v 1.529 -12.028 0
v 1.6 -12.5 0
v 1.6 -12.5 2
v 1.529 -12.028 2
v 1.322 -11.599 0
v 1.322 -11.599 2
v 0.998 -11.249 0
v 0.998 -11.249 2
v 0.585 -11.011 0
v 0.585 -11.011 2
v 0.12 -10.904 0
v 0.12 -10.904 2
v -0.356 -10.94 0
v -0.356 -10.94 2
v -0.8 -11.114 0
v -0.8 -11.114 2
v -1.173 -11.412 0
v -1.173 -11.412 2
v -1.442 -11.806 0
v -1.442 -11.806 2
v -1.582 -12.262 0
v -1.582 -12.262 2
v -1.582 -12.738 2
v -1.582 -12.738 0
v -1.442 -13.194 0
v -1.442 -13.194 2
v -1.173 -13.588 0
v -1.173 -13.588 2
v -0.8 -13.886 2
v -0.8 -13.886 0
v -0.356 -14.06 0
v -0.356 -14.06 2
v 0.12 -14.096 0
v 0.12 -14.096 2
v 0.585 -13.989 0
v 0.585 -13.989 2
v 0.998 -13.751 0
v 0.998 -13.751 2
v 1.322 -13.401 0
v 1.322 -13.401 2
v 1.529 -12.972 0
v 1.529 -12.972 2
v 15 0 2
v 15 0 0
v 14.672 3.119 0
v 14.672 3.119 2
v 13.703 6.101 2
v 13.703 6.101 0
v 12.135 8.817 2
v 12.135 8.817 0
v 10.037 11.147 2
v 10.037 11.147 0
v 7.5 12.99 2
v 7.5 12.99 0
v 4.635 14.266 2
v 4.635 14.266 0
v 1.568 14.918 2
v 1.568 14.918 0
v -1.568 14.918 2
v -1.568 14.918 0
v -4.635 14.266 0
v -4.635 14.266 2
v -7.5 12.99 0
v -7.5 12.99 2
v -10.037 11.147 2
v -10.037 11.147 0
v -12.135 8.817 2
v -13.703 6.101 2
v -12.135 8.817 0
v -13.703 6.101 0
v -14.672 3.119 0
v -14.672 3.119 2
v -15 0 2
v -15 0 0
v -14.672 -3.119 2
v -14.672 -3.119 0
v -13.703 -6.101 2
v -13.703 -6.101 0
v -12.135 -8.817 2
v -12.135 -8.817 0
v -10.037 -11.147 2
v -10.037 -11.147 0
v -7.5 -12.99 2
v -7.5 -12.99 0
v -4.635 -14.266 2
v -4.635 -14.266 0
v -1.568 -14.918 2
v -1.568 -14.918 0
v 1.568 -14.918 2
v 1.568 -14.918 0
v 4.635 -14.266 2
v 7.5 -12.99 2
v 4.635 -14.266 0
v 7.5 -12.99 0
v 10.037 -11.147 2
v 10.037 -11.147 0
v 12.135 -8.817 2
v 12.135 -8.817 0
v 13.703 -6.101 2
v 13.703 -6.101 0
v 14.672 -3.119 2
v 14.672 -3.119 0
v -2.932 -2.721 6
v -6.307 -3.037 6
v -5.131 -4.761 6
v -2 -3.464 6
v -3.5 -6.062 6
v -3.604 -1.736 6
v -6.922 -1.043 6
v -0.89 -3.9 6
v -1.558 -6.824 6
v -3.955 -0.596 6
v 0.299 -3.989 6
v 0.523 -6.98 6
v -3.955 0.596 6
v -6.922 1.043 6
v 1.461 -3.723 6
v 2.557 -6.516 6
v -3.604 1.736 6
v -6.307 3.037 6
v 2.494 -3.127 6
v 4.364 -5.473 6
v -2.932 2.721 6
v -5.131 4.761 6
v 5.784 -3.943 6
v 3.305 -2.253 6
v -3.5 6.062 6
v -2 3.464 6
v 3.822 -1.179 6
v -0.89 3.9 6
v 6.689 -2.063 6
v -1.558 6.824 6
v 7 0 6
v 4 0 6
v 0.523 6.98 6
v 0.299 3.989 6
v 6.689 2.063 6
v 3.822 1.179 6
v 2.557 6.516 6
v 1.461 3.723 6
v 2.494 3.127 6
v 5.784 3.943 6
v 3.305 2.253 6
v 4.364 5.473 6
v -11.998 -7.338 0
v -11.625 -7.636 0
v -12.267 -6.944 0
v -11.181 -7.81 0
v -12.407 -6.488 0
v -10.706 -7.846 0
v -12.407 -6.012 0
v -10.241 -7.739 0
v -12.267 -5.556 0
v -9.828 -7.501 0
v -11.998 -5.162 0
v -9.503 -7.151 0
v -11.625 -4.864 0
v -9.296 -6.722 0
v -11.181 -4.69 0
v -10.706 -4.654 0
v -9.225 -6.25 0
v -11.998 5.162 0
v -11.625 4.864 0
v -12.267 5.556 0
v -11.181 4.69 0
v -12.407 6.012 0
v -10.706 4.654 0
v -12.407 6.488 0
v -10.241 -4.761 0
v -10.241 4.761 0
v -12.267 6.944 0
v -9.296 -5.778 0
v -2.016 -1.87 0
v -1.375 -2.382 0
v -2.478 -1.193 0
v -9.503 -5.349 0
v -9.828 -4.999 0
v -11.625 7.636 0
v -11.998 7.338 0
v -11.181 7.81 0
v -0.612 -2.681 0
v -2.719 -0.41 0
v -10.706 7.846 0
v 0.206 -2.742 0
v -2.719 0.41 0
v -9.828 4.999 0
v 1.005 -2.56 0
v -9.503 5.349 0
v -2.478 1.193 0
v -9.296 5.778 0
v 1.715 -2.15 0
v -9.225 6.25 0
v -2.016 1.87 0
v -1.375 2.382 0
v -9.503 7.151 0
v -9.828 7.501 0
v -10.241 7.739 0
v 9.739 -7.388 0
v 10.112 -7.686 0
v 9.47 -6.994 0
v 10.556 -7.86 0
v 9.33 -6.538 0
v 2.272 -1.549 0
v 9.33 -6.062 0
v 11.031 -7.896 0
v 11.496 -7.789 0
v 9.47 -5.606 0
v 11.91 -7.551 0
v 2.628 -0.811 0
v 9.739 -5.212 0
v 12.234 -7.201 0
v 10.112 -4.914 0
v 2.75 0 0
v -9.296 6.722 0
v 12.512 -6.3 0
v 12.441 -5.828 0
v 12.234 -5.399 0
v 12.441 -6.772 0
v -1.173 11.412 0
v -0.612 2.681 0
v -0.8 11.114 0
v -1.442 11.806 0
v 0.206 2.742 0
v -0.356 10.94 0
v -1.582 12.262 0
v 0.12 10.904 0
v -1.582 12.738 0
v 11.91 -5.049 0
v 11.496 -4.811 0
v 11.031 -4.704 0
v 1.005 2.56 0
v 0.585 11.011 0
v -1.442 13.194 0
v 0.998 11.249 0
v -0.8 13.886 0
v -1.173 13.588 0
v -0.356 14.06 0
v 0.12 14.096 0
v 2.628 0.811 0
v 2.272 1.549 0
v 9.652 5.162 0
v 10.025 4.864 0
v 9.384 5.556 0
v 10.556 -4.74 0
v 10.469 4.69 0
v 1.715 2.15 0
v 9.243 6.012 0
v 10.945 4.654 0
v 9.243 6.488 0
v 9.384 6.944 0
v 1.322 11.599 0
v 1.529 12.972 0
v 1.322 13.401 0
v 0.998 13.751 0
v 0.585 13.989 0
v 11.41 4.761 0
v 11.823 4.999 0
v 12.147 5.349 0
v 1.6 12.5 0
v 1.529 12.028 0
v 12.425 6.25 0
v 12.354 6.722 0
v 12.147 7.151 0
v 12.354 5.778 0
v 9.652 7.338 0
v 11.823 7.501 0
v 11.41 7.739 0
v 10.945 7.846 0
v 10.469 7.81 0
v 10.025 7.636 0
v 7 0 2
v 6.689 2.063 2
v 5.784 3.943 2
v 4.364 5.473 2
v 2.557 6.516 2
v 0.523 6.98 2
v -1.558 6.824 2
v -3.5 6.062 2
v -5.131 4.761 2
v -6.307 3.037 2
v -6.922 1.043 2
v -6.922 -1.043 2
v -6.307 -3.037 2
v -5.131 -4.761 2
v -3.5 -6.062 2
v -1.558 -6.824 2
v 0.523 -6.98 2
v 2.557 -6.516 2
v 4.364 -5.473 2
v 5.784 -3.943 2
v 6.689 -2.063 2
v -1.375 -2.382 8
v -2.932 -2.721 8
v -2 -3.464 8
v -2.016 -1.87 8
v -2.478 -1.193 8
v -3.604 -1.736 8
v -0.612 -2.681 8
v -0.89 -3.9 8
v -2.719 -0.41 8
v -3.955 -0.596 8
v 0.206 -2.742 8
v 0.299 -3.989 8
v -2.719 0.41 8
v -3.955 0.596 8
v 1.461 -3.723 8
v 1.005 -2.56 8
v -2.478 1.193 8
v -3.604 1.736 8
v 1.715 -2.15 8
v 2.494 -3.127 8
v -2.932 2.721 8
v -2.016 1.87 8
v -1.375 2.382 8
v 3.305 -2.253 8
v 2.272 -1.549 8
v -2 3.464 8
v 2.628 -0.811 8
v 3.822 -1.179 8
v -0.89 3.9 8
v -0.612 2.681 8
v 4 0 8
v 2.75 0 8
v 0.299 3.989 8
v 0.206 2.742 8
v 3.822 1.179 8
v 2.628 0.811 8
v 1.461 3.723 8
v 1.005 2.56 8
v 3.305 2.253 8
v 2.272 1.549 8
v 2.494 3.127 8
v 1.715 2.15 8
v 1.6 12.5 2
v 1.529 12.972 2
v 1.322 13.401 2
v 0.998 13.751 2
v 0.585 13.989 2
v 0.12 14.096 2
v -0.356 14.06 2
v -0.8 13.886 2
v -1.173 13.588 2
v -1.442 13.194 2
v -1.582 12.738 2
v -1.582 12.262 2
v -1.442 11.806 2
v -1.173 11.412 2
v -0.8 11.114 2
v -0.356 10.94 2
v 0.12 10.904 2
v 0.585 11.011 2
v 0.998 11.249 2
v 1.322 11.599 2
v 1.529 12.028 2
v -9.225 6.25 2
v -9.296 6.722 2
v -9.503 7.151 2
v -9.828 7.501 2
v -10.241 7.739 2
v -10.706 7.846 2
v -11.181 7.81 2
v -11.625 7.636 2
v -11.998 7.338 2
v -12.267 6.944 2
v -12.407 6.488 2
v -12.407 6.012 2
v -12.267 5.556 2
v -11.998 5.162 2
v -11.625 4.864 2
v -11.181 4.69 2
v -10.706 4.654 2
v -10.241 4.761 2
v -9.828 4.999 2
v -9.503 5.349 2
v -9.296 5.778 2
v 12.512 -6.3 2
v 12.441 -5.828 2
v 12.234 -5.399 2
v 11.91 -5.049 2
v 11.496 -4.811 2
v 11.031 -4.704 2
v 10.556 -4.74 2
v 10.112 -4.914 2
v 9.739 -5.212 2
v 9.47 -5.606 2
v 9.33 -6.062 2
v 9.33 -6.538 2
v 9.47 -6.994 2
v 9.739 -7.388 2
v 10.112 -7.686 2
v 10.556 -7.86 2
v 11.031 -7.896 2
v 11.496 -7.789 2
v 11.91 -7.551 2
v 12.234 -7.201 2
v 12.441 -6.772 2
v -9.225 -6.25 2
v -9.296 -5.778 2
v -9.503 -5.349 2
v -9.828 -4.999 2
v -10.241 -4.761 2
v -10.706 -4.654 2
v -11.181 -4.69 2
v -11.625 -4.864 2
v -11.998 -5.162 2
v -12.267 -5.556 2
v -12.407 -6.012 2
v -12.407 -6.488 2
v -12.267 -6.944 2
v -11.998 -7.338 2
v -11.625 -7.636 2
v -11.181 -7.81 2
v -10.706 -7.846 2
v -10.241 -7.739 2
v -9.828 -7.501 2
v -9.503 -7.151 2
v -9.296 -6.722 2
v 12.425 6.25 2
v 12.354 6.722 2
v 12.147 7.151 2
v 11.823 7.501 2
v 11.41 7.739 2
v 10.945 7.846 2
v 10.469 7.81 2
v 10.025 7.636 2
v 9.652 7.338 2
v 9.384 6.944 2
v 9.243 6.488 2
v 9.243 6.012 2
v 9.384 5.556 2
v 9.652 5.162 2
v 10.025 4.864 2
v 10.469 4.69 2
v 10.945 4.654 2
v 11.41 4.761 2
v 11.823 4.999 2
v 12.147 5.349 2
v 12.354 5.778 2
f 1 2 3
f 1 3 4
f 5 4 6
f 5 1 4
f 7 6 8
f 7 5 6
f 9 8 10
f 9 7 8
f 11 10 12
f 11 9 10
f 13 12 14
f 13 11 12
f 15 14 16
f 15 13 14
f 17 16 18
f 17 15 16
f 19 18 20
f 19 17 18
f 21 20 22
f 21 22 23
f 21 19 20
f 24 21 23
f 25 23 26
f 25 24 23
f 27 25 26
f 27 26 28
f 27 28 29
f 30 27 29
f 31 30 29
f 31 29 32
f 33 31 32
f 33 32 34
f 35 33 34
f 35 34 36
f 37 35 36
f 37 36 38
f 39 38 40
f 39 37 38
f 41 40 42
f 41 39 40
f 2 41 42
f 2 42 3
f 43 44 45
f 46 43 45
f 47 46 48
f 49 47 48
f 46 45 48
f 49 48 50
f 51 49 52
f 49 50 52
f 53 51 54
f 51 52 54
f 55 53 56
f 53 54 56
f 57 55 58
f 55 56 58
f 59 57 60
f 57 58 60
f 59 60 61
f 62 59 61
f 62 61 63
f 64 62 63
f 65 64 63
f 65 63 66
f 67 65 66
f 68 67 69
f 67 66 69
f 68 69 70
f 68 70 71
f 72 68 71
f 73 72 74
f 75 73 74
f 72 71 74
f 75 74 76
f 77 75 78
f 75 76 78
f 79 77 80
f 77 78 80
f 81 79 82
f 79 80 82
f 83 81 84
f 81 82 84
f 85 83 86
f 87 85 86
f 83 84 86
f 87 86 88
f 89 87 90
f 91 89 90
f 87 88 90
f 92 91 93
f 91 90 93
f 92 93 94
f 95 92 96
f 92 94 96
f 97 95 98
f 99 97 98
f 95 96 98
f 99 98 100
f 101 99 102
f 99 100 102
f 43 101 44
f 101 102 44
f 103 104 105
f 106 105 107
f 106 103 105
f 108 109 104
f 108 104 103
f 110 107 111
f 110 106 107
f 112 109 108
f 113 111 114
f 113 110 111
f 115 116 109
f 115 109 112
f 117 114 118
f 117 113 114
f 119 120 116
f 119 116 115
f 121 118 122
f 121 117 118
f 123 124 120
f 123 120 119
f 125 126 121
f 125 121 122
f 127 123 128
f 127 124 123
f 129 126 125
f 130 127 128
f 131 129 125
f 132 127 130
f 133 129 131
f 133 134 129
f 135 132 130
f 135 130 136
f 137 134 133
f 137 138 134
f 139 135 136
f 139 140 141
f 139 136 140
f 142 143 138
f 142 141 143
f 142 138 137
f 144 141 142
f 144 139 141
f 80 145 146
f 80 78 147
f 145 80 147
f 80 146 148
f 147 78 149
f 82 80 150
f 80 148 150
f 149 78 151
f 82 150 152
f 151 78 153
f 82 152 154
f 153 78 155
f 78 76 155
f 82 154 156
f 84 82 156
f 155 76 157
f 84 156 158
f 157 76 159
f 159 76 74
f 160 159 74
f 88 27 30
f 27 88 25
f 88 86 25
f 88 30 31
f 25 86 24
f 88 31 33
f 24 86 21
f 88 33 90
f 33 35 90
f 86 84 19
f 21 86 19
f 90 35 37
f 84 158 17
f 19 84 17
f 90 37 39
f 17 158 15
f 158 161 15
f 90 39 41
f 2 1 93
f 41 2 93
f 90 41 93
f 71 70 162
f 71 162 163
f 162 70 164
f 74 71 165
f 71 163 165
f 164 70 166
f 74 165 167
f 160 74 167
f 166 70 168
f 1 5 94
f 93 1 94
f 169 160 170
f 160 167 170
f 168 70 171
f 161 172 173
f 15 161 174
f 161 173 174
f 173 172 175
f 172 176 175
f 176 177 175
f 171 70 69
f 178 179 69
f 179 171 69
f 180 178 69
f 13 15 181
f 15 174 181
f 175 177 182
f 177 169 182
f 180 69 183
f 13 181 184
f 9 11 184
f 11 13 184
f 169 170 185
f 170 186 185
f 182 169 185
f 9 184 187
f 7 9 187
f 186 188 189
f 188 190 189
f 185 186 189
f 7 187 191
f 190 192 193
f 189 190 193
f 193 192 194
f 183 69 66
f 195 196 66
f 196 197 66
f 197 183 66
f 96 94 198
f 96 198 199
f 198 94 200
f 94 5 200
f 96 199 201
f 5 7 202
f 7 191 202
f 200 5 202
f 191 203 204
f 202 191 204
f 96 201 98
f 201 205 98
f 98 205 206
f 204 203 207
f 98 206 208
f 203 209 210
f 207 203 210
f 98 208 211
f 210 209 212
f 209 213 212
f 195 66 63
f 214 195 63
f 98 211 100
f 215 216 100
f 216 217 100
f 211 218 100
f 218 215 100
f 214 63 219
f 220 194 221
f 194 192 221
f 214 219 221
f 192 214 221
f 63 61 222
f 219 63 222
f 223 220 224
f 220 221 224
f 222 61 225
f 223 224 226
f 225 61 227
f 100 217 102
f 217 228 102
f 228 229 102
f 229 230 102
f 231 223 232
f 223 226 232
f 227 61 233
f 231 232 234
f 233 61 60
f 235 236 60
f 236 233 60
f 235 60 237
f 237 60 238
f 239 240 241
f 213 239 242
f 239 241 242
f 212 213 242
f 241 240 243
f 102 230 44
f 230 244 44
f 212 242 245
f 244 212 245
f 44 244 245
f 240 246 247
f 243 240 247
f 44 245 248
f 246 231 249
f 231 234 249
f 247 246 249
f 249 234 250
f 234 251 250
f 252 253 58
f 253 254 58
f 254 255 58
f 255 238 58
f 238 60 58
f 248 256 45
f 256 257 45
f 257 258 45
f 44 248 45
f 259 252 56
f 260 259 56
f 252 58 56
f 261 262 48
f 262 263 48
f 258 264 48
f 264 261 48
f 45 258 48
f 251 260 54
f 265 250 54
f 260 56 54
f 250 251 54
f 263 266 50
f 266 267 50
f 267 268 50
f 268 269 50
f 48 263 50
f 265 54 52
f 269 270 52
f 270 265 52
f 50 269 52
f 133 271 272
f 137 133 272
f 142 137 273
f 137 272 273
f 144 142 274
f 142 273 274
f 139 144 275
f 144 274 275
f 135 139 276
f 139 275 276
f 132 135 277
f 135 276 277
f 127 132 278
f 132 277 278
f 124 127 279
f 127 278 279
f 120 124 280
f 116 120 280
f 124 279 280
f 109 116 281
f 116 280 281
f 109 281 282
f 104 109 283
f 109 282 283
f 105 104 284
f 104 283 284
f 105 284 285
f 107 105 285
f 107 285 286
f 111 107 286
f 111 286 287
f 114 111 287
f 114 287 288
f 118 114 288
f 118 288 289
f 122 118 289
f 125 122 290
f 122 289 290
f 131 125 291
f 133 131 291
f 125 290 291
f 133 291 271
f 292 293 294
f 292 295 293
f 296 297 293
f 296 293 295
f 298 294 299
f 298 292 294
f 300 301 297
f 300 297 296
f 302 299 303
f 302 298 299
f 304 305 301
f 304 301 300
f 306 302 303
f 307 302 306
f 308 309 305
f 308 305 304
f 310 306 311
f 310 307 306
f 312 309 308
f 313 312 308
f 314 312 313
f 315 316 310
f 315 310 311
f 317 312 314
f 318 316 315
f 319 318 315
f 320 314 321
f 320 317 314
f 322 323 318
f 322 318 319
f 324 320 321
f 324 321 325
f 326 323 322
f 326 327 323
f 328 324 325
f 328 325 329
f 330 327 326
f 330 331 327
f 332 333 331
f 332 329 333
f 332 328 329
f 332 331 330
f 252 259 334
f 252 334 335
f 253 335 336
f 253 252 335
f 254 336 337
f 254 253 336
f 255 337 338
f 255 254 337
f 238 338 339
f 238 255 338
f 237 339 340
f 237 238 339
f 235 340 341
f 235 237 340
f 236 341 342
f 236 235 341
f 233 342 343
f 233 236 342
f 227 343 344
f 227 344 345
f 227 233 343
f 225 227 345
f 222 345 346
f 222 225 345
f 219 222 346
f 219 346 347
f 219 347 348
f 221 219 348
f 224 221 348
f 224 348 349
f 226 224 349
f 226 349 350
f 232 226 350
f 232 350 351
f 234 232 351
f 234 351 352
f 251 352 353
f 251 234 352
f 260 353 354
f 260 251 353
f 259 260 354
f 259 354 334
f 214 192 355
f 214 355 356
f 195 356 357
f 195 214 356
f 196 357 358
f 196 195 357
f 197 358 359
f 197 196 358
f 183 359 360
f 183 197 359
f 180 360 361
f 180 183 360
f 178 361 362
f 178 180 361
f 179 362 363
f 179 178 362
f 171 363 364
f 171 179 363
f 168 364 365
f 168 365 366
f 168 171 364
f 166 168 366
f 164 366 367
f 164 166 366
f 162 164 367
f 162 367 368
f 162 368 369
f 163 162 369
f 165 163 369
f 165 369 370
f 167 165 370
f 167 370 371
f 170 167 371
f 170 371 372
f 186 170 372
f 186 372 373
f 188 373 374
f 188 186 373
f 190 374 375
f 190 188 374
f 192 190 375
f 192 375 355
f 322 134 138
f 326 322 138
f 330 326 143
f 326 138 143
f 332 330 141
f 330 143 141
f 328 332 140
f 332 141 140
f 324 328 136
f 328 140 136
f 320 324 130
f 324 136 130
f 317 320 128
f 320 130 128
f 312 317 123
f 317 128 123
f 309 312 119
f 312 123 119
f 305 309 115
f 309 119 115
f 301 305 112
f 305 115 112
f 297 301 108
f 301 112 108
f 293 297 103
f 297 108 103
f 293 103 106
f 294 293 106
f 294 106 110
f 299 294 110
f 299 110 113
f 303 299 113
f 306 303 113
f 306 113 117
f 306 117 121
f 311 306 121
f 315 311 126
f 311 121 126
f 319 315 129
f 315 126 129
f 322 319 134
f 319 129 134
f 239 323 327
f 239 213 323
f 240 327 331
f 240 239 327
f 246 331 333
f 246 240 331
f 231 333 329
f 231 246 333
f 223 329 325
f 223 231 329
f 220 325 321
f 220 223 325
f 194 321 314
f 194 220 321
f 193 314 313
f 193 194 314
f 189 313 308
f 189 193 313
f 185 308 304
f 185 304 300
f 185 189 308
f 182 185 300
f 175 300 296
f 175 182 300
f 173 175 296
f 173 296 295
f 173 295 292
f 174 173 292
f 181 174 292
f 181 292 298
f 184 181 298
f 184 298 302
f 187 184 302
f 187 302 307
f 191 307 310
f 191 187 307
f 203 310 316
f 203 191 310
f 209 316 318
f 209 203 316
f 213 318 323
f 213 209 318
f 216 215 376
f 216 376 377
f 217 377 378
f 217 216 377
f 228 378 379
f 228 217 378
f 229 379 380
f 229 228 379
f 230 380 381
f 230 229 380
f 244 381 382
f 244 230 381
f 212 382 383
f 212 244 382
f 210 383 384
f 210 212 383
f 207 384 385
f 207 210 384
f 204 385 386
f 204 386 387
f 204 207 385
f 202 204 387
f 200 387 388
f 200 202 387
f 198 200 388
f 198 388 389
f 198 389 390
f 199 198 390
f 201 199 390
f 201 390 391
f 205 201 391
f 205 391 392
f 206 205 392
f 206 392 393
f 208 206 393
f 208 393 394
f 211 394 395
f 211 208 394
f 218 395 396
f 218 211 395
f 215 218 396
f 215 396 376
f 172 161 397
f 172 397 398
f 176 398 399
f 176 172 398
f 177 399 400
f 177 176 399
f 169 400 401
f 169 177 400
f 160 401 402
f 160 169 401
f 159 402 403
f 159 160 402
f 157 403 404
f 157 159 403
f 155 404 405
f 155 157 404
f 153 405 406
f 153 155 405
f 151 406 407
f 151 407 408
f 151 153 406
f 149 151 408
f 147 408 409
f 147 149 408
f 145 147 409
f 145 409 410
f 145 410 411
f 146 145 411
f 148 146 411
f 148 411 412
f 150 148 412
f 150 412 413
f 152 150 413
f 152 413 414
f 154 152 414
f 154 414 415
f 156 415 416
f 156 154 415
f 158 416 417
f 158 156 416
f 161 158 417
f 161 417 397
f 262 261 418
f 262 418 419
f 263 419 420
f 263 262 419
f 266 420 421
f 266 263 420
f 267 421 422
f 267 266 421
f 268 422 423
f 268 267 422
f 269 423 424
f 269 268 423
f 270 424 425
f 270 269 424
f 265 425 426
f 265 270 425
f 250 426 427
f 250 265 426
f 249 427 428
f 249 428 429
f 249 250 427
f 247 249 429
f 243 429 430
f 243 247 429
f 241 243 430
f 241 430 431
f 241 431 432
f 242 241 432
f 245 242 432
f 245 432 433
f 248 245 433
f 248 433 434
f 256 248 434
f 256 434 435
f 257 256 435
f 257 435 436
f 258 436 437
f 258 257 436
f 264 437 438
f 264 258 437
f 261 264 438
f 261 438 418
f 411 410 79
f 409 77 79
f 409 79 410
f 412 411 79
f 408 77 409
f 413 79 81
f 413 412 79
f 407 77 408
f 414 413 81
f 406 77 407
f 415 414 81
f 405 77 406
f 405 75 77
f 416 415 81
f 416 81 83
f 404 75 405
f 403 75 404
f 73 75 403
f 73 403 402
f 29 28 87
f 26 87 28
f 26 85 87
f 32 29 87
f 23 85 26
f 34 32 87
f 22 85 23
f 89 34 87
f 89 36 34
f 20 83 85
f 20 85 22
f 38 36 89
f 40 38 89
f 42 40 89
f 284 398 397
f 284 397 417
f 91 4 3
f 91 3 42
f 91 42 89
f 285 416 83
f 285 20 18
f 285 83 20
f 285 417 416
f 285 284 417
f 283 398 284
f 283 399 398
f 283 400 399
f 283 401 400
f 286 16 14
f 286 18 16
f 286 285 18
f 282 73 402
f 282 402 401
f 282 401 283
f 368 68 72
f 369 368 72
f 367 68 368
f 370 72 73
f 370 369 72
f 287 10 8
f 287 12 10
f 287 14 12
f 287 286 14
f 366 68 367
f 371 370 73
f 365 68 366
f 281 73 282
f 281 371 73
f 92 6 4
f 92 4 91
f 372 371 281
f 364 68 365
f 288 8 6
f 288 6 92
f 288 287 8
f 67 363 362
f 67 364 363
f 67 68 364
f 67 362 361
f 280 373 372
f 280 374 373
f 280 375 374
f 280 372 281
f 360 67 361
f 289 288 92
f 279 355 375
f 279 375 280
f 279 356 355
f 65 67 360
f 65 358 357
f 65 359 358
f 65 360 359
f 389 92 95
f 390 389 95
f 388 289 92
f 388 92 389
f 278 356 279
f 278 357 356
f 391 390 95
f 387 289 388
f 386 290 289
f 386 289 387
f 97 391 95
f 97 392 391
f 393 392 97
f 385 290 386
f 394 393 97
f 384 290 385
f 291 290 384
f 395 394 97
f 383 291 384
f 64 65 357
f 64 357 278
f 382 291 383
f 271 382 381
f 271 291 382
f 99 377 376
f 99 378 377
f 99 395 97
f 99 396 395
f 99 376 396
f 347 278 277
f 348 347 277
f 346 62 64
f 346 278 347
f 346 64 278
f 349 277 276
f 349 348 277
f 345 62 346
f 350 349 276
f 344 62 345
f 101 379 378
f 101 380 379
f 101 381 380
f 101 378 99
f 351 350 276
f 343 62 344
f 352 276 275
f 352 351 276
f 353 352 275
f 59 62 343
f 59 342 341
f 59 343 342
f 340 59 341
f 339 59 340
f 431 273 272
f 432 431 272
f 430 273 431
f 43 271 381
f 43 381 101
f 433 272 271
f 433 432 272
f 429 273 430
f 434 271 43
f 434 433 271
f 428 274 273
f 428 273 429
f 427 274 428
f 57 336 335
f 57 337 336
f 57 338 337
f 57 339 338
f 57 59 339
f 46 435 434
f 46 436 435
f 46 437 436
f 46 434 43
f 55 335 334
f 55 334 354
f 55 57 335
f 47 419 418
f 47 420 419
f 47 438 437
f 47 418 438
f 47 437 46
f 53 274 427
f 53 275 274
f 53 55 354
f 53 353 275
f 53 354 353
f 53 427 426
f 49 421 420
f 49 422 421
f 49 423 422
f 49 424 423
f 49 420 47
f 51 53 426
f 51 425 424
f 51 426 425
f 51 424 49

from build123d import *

# Parameters (mm, degrees)
ESQUISSE1_R        = 15
ESQUISSE1_R_2      = 1.6
ESQUISSE1_R_3      = 2.75
BOSS_EXTRU_1_DEPTH = 2
ESQUISSE2_R        = 7
ESQUISSE2_R_2      = 2.75
BOSS_EXTRU_2_DEPTH = 4
ESQUISSE3_R        = 4
ESQUISSE3_R_2      = 2.75
BOSS_EXTRU_3_DEPTH = 2


with BuildPart() as part:
    # Esquisse1 → Boss.-Extru.1 (new body)
    with BuildSketch(Plane.XY):
        Circle(ESQUISSE1_R)
        with Locations((0, 12.5)):
            Circle(ESQUISSE1_R_2, mode=Mode.SUBTRACT)
        with Locations((-10.825317547, 6.25)):
            Circle(ESQUISSE1_R_2, mode=Mode.SUBTRACT)
        with Locations((-10.825317547, -6.25)):
            Circle(ESQUISSE1_R_2, mode=Mode.SUBTRACT)
        with Locations((0, -12.5)):
            Circle(ESQUISSE1_R_2, mode=Mode.SUBTRACT)
        with Locations((10.911920088, -6.3)):
            Circle(ESQUISSE1_R_2, mode=Mode.SUBTRACT)
        with Locations((10.825317547, 6.25)):
            Circle(ESQUISSE1_R_2, mode=Mode.SUBTRACT)
        Circle(ESQUISSE1_R_3, mode=Mode.SUBTRACT)
    extrude(amount=BOSS_EXTRU_1_DEPTH)

    # Esquisse2 → Boss.-Extru.2 (add)
    with BuildSketch(Plane.XY.offset(2)):
        Circle(ESQUISSE2_R)
        Circle(ESQUISSE2_R_2, mode=Mode.SUBTRACT)
    extrude(amount=BOSS_EXTRU_2_DEPTH)

    # Esquisse3 → Boss.-Extru.3 (add)
    with BuildSketch(Plane.XY.offset(6)):
        Circle(ESQUISSE3_R)
        Circle(ESQUISSE3_R_2, mode=Mode.SUBTRACT)
    extrude(amount=BOSS_EXTRU_3_DEPTH)


solid = part.part
